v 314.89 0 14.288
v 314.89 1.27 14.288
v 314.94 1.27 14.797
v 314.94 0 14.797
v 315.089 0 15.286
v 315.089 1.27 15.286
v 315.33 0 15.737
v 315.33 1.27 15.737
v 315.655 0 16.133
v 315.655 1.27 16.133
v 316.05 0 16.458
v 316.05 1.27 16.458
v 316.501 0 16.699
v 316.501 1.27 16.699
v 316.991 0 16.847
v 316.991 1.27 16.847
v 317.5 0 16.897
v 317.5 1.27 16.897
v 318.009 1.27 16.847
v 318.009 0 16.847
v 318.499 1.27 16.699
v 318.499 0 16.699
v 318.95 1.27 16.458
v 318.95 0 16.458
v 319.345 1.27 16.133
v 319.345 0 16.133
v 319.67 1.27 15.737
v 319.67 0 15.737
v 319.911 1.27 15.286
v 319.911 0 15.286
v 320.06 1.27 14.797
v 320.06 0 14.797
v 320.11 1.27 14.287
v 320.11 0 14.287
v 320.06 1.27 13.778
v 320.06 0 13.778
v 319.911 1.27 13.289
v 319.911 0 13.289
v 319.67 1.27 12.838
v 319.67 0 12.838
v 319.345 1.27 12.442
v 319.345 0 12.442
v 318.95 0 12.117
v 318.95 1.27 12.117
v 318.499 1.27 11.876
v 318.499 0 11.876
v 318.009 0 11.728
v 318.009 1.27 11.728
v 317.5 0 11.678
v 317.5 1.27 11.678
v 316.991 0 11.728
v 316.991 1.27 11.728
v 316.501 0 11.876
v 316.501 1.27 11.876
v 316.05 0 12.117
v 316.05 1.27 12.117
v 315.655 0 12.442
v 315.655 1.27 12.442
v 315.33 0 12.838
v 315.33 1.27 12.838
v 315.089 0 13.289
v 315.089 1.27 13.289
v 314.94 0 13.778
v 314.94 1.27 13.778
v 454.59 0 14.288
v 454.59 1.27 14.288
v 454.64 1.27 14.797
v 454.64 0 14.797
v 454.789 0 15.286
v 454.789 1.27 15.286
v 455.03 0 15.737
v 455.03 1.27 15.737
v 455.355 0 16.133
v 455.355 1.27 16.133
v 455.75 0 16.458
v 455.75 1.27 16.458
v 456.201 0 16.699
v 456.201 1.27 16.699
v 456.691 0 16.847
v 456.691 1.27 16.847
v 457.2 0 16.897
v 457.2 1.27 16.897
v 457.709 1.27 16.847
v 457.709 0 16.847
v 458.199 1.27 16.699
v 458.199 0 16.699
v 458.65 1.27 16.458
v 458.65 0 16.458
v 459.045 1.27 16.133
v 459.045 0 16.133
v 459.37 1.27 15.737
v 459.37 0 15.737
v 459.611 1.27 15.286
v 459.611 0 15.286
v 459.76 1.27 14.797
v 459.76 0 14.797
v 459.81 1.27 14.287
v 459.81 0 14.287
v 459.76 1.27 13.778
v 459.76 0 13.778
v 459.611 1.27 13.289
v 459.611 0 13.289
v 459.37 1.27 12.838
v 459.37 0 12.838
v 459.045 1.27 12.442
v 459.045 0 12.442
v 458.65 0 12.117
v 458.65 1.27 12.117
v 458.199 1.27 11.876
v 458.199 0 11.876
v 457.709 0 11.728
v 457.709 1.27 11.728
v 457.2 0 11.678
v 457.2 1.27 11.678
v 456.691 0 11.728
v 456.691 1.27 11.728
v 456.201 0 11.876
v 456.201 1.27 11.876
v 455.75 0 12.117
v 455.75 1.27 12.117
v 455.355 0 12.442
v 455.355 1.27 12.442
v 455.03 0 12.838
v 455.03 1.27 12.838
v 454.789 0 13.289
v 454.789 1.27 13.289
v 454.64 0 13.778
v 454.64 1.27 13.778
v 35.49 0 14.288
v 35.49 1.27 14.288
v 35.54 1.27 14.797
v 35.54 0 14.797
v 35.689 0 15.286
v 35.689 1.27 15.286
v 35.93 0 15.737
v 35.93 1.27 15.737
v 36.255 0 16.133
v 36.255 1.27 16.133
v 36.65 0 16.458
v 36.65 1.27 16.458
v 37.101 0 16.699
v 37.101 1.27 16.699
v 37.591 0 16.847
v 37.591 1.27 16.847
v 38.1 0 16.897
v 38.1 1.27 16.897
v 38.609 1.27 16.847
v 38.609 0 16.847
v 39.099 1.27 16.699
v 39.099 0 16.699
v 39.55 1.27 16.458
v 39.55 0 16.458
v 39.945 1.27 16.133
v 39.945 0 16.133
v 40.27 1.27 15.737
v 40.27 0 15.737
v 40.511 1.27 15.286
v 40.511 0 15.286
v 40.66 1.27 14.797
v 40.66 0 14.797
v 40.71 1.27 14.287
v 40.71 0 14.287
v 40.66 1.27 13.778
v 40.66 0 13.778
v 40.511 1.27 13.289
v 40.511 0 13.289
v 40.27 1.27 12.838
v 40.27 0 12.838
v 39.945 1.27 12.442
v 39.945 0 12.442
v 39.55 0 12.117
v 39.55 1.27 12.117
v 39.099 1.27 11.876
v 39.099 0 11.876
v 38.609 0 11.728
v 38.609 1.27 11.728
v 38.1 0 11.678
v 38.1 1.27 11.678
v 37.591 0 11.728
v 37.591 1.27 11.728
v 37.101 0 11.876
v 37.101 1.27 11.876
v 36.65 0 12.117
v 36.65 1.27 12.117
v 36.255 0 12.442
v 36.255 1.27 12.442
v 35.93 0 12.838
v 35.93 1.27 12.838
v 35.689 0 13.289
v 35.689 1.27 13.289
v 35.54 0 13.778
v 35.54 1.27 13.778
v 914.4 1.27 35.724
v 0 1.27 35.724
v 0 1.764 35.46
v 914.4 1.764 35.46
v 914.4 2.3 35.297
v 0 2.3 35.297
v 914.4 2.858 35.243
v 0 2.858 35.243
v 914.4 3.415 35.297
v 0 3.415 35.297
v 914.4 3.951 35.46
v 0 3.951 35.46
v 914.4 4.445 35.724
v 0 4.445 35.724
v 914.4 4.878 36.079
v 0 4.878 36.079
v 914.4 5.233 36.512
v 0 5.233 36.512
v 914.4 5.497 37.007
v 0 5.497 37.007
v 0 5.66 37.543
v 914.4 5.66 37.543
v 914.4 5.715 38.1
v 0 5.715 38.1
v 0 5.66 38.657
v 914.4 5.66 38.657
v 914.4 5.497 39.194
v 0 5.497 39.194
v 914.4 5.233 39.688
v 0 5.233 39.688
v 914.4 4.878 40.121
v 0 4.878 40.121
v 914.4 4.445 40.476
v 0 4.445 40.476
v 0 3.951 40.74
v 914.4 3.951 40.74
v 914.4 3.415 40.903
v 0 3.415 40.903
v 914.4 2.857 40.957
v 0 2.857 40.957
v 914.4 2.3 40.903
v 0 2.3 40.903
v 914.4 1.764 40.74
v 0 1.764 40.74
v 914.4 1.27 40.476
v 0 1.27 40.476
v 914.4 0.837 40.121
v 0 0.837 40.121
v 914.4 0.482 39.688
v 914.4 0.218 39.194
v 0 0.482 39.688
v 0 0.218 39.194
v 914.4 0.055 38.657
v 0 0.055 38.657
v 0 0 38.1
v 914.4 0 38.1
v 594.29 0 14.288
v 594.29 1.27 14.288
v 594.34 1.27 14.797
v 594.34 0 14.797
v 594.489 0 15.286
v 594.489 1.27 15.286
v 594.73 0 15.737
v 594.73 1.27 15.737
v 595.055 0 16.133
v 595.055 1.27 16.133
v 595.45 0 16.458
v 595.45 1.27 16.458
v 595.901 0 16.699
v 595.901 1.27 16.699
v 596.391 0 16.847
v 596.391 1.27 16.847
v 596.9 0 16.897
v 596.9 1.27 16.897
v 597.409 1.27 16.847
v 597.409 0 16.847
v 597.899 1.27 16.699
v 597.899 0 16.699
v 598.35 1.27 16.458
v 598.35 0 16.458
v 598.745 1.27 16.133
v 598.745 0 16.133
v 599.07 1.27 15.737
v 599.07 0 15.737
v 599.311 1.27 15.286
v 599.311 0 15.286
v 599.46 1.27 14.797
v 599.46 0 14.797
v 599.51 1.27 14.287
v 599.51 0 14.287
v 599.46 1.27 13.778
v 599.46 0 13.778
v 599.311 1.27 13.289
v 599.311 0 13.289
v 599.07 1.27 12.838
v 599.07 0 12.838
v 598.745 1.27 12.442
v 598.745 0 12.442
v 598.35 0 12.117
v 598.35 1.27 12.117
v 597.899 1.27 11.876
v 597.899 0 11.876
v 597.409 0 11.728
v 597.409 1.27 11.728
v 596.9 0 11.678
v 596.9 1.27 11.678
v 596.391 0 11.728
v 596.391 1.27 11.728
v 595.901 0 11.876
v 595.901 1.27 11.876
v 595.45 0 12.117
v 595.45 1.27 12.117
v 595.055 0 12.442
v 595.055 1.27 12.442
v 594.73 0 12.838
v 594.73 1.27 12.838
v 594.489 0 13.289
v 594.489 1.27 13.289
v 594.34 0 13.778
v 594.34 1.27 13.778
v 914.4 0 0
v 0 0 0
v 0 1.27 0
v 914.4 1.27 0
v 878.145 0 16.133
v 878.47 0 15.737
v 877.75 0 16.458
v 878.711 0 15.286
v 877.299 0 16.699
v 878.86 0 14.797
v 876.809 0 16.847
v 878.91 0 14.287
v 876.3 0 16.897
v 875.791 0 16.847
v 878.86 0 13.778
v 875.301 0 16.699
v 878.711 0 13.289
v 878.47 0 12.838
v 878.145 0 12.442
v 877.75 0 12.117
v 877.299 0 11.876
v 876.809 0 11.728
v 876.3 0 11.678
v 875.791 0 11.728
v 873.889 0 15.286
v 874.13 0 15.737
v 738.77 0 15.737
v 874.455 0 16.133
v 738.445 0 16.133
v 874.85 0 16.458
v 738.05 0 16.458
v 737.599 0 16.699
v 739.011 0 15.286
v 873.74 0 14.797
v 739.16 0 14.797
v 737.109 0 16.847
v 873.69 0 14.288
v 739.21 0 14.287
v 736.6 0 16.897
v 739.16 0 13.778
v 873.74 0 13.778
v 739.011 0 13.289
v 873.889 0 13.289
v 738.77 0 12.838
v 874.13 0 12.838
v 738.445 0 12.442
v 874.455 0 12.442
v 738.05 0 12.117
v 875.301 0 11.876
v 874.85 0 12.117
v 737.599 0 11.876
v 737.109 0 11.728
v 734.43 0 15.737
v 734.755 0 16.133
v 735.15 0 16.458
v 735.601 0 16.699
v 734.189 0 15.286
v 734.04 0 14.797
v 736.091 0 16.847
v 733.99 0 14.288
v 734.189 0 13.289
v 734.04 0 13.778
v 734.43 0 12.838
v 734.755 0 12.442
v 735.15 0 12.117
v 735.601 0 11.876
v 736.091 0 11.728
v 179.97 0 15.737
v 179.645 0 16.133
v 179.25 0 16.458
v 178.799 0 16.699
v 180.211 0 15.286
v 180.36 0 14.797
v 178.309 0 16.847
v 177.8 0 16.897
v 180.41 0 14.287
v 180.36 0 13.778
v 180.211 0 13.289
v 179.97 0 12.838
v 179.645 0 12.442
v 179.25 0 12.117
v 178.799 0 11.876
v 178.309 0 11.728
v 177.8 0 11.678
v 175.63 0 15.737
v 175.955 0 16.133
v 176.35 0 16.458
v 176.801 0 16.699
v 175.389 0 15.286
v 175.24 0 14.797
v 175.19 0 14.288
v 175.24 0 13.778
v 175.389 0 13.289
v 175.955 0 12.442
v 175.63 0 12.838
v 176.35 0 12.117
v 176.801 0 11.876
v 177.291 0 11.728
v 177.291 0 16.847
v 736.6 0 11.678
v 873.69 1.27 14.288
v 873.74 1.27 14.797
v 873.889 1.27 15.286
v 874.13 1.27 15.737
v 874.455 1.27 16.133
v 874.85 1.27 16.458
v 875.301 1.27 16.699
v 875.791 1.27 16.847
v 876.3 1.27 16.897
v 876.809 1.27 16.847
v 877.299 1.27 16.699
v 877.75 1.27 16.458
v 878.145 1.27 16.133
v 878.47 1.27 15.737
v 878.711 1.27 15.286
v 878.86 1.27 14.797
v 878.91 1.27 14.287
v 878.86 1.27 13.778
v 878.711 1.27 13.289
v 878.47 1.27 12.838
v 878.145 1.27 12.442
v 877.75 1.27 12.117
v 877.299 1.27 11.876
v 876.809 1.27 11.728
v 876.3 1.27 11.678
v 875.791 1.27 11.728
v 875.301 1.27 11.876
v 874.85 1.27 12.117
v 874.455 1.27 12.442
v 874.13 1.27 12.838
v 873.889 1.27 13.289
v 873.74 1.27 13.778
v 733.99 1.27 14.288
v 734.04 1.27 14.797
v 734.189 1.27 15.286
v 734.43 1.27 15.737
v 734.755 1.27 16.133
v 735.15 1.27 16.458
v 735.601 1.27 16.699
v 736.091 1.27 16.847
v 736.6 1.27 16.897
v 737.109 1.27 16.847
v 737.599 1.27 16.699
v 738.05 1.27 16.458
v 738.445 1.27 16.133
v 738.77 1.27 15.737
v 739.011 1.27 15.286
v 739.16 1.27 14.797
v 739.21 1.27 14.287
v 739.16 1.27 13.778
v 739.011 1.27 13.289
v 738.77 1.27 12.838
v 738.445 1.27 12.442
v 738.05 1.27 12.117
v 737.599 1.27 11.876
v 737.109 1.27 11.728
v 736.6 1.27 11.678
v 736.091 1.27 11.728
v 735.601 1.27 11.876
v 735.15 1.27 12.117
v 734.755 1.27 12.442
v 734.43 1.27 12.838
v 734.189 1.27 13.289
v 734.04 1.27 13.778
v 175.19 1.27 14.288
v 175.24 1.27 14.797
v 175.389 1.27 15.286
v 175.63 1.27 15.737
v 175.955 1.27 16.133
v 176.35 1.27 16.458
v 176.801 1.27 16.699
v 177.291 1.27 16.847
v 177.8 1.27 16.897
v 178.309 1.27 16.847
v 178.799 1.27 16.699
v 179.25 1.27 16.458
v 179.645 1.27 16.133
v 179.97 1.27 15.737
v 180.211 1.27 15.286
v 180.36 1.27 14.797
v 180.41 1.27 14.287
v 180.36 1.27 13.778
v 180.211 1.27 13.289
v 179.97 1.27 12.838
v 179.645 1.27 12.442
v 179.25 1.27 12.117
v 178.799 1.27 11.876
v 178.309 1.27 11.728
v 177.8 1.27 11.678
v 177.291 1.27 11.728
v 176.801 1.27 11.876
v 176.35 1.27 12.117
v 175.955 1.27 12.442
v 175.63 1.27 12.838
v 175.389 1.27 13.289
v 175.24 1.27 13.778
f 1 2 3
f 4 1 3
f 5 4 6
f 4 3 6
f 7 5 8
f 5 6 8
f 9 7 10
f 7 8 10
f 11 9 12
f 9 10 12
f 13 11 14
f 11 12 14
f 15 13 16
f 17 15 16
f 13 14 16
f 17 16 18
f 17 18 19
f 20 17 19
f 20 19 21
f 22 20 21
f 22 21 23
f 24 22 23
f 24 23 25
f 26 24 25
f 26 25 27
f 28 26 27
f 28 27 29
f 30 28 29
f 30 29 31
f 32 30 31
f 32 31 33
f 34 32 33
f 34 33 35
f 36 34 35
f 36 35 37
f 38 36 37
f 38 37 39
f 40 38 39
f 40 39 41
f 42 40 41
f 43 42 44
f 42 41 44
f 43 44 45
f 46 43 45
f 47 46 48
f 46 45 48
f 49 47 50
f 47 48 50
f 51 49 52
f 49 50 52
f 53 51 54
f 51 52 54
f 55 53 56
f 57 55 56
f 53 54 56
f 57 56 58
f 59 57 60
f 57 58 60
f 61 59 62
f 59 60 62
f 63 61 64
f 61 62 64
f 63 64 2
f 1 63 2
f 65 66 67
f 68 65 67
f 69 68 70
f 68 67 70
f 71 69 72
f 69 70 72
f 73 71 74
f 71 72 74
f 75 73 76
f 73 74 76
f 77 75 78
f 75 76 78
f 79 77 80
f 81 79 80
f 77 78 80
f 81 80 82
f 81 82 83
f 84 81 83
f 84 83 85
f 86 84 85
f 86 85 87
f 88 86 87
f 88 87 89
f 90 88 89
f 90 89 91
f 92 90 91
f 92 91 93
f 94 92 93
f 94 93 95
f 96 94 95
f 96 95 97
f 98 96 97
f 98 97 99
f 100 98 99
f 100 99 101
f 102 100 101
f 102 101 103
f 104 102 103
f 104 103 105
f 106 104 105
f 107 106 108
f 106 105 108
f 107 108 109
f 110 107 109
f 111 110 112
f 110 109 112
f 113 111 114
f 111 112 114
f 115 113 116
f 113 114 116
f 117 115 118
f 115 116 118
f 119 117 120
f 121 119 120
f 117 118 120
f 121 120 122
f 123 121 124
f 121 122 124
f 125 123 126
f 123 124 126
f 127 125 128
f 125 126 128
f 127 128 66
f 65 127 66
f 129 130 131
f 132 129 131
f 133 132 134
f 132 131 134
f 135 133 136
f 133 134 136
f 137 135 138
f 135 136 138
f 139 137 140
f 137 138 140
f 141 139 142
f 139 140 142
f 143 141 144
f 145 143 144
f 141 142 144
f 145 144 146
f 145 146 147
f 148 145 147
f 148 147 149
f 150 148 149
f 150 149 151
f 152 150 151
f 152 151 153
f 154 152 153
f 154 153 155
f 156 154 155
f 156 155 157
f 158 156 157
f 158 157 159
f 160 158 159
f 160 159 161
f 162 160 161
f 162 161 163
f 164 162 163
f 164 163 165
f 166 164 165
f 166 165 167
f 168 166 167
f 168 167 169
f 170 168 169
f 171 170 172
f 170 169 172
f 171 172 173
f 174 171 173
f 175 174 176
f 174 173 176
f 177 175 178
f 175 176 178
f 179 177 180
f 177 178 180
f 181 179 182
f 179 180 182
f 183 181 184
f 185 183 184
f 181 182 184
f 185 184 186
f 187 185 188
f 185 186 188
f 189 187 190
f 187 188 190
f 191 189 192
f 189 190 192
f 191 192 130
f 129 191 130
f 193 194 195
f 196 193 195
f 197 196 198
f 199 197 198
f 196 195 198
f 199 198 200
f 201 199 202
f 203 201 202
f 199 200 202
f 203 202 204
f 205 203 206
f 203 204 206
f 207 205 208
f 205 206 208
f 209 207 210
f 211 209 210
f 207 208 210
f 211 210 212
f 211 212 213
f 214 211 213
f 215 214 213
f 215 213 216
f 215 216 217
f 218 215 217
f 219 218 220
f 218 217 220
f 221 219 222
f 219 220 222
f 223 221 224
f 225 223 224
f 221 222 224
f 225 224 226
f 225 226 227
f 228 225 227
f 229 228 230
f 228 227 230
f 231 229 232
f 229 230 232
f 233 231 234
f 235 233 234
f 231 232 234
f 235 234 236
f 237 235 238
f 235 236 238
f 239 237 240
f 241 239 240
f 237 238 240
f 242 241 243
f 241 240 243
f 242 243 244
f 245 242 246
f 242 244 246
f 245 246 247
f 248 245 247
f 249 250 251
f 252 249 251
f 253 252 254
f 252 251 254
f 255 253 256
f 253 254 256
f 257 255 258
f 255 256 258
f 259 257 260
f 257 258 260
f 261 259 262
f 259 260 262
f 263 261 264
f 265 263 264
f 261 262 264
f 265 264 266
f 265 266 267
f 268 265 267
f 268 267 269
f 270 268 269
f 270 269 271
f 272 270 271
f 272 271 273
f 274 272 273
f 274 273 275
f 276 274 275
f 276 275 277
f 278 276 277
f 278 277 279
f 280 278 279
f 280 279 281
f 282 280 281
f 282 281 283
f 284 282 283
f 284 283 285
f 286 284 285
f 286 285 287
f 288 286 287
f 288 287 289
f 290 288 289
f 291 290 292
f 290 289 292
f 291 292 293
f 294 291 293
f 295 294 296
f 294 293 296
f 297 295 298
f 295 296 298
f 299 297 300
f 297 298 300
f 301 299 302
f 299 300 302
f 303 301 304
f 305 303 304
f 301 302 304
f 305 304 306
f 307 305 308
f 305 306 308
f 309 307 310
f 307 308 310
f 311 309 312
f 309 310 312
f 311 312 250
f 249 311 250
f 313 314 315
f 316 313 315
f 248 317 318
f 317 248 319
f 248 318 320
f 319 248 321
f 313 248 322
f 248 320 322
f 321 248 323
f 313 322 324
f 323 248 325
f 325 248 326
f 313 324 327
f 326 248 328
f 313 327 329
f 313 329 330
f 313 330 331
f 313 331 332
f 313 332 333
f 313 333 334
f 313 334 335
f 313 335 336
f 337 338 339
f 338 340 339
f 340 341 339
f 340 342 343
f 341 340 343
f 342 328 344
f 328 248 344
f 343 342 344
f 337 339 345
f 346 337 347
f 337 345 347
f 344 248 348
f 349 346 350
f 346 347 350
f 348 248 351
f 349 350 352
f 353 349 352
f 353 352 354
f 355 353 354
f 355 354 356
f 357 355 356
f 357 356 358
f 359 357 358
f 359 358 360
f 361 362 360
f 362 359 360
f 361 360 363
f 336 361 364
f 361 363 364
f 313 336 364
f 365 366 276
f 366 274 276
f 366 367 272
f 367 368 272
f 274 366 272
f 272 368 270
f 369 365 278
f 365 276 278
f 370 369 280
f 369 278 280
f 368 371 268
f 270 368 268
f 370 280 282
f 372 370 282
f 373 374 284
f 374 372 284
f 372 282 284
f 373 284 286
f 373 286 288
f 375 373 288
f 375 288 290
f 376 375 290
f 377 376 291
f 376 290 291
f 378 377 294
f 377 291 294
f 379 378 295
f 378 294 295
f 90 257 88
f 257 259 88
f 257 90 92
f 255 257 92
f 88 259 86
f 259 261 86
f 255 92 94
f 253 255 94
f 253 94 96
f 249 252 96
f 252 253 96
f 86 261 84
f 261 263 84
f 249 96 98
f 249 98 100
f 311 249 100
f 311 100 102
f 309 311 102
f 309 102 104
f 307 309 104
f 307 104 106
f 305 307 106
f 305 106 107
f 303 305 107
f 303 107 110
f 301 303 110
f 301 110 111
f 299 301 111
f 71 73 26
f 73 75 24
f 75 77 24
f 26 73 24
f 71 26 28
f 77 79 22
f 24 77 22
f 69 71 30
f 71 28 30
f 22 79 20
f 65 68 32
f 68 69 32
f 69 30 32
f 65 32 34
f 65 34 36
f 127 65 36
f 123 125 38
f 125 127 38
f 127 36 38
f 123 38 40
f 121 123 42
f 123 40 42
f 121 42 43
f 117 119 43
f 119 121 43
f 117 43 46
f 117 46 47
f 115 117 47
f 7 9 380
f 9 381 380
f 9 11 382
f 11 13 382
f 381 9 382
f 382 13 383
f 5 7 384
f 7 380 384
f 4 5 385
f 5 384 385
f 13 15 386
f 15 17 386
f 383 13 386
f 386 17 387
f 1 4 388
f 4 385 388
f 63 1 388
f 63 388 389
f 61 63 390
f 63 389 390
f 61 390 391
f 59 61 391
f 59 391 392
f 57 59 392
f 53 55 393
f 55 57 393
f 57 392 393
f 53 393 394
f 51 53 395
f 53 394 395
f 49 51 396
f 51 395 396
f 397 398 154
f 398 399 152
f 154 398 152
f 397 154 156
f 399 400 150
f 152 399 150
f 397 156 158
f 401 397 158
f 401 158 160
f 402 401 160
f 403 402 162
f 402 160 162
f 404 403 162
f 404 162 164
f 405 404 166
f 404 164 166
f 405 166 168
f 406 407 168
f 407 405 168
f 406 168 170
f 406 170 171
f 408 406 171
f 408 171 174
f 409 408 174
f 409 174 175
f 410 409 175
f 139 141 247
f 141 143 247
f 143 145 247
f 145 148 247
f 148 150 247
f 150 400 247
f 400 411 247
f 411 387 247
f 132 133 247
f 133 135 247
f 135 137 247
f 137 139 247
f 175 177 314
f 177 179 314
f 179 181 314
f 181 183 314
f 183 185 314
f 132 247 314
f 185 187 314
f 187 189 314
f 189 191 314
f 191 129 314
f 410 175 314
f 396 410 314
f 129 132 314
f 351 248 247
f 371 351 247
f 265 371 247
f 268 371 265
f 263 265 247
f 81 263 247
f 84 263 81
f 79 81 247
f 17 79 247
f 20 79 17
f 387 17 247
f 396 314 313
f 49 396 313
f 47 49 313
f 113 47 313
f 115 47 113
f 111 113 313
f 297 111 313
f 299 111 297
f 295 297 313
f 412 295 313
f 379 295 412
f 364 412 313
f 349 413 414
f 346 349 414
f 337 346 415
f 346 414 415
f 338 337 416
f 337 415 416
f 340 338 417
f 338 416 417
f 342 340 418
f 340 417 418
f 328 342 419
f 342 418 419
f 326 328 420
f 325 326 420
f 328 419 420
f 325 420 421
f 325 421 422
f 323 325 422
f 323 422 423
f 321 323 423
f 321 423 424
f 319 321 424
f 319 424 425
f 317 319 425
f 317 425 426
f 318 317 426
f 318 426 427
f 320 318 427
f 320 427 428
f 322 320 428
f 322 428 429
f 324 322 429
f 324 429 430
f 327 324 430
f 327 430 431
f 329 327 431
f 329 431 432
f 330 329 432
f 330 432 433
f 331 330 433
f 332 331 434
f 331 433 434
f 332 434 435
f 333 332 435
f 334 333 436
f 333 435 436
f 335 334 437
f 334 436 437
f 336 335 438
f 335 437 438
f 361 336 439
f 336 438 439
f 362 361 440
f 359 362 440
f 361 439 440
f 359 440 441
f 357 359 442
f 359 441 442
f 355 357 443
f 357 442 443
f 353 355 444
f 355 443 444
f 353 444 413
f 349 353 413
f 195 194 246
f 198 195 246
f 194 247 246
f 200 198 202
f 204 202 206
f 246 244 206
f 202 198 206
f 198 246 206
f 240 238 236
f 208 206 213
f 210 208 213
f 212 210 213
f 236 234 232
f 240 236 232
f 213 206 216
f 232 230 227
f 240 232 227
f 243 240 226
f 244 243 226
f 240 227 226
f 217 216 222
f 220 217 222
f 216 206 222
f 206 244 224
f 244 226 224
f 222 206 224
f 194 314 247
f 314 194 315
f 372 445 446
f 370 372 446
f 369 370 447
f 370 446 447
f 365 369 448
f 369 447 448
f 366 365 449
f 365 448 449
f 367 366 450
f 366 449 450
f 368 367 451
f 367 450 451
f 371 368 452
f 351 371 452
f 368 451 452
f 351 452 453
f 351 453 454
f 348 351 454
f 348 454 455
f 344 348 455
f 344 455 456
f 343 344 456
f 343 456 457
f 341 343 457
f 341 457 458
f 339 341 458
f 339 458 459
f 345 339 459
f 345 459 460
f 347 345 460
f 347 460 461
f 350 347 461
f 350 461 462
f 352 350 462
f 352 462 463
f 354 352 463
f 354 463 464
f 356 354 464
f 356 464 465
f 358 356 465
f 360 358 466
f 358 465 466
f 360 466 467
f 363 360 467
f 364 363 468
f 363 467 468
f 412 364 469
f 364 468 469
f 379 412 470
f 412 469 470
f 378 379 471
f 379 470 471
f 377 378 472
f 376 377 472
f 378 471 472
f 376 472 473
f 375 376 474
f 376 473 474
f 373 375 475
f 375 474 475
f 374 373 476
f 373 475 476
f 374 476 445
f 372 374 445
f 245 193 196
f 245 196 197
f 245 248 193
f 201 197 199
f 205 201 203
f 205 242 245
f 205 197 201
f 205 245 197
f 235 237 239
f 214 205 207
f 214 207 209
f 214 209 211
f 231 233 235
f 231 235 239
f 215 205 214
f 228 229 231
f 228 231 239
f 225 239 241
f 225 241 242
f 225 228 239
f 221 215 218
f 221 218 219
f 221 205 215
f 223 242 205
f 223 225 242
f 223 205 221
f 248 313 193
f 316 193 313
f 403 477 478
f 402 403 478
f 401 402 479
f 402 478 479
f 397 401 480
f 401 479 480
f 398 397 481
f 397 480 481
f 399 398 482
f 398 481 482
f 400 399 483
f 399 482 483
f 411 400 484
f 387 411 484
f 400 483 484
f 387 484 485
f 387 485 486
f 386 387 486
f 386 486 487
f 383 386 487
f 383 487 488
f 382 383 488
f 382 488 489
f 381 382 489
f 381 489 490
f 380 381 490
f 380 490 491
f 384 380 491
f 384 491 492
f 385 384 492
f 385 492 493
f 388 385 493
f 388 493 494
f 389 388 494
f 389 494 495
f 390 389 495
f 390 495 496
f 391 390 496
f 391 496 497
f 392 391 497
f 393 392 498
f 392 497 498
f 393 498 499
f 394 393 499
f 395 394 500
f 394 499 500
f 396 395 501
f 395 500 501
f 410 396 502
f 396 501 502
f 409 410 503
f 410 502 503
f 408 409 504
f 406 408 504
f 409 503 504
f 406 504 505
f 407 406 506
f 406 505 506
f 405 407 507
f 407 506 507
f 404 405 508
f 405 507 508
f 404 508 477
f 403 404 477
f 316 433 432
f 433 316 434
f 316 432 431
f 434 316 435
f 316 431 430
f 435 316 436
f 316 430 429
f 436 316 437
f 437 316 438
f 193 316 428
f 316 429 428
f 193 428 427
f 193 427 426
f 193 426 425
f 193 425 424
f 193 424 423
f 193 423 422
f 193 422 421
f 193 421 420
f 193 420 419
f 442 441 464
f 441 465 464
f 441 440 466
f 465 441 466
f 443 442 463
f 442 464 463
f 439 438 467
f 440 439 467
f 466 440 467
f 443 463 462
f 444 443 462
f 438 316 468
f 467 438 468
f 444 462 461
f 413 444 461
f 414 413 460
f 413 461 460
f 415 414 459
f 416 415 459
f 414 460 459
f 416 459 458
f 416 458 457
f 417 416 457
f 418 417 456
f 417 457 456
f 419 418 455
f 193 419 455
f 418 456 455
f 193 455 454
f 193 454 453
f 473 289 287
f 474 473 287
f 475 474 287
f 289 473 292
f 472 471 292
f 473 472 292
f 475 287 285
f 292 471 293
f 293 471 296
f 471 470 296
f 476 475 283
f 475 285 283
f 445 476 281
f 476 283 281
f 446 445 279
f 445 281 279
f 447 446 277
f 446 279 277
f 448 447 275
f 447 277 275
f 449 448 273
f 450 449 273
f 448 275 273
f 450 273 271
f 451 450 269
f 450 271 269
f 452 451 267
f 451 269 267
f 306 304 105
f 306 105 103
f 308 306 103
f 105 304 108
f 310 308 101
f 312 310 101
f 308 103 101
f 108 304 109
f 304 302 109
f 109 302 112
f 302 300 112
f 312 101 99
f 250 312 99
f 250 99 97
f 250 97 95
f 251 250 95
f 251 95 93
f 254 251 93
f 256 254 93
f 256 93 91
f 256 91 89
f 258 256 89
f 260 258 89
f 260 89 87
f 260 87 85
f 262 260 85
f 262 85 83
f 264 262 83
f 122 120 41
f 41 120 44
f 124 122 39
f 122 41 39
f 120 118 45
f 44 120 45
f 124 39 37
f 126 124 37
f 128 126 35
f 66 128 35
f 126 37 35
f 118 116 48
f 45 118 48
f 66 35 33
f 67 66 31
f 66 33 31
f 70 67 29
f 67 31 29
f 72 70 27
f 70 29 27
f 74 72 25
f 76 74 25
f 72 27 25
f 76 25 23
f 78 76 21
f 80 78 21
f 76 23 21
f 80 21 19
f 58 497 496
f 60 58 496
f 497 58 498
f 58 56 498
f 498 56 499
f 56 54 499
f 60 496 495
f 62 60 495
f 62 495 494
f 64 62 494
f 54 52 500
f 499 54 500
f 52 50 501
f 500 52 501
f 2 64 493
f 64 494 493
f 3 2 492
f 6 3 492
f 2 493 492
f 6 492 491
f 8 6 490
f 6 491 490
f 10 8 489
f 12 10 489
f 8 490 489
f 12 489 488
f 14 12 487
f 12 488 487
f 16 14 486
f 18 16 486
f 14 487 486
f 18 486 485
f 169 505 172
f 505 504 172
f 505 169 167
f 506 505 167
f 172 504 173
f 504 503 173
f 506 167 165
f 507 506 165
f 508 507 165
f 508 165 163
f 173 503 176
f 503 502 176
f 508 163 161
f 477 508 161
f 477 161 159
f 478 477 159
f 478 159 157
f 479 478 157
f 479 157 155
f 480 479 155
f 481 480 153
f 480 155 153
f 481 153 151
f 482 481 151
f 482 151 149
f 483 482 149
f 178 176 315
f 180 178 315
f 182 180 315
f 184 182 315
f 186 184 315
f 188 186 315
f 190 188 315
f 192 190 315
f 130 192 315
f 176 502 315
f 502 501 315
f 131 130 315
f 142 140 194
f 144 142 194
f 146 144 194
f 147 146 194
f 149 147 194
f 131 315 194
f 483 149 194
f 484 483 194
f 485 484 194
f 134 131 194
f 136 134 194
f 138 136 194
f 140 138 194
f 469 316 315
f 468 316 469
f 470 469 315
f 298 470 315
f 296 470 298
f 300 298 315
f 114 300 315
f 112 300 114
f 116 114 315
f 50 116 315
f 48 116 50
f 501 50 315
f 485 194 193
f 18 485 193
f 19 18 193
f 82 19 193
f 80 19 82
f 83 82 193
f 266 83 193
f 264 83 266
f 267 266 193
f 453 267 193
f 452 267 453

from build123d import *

# Parameters (mm, degrees)
F1_DEPTH = 914.4
F3_D     = 5.2197


with BuildPart() as f1:
    # F0 (on Right) → F1 (new body)
    with BuildSketch(Plane.YZ):
        with BuildLine():
            Line((0, 38.1), (0, 0))
            Line((0, 0), (1.27, 0))
            Line((1.27, 0), (1.27, 35.7240475594))
            ThreePointArc((1.27, 35.7240475594), (5.3775781238, 39.4470384182), (0, 38.1))
        make_face()
    extrude(amount=F1_DEPTH)

    # F3 (through all)
    with Locations(Plane.XZ):
        with Locations((38.1, 14.2875), (177.8, 14.2875), (317.5, 14.2875), (596.9, 14.2875), (736.6, 14.2875), (876.3, 14.2875), (457.2, 14.2875)):
            Hole(F3_D / 2)


solid = f1.part
